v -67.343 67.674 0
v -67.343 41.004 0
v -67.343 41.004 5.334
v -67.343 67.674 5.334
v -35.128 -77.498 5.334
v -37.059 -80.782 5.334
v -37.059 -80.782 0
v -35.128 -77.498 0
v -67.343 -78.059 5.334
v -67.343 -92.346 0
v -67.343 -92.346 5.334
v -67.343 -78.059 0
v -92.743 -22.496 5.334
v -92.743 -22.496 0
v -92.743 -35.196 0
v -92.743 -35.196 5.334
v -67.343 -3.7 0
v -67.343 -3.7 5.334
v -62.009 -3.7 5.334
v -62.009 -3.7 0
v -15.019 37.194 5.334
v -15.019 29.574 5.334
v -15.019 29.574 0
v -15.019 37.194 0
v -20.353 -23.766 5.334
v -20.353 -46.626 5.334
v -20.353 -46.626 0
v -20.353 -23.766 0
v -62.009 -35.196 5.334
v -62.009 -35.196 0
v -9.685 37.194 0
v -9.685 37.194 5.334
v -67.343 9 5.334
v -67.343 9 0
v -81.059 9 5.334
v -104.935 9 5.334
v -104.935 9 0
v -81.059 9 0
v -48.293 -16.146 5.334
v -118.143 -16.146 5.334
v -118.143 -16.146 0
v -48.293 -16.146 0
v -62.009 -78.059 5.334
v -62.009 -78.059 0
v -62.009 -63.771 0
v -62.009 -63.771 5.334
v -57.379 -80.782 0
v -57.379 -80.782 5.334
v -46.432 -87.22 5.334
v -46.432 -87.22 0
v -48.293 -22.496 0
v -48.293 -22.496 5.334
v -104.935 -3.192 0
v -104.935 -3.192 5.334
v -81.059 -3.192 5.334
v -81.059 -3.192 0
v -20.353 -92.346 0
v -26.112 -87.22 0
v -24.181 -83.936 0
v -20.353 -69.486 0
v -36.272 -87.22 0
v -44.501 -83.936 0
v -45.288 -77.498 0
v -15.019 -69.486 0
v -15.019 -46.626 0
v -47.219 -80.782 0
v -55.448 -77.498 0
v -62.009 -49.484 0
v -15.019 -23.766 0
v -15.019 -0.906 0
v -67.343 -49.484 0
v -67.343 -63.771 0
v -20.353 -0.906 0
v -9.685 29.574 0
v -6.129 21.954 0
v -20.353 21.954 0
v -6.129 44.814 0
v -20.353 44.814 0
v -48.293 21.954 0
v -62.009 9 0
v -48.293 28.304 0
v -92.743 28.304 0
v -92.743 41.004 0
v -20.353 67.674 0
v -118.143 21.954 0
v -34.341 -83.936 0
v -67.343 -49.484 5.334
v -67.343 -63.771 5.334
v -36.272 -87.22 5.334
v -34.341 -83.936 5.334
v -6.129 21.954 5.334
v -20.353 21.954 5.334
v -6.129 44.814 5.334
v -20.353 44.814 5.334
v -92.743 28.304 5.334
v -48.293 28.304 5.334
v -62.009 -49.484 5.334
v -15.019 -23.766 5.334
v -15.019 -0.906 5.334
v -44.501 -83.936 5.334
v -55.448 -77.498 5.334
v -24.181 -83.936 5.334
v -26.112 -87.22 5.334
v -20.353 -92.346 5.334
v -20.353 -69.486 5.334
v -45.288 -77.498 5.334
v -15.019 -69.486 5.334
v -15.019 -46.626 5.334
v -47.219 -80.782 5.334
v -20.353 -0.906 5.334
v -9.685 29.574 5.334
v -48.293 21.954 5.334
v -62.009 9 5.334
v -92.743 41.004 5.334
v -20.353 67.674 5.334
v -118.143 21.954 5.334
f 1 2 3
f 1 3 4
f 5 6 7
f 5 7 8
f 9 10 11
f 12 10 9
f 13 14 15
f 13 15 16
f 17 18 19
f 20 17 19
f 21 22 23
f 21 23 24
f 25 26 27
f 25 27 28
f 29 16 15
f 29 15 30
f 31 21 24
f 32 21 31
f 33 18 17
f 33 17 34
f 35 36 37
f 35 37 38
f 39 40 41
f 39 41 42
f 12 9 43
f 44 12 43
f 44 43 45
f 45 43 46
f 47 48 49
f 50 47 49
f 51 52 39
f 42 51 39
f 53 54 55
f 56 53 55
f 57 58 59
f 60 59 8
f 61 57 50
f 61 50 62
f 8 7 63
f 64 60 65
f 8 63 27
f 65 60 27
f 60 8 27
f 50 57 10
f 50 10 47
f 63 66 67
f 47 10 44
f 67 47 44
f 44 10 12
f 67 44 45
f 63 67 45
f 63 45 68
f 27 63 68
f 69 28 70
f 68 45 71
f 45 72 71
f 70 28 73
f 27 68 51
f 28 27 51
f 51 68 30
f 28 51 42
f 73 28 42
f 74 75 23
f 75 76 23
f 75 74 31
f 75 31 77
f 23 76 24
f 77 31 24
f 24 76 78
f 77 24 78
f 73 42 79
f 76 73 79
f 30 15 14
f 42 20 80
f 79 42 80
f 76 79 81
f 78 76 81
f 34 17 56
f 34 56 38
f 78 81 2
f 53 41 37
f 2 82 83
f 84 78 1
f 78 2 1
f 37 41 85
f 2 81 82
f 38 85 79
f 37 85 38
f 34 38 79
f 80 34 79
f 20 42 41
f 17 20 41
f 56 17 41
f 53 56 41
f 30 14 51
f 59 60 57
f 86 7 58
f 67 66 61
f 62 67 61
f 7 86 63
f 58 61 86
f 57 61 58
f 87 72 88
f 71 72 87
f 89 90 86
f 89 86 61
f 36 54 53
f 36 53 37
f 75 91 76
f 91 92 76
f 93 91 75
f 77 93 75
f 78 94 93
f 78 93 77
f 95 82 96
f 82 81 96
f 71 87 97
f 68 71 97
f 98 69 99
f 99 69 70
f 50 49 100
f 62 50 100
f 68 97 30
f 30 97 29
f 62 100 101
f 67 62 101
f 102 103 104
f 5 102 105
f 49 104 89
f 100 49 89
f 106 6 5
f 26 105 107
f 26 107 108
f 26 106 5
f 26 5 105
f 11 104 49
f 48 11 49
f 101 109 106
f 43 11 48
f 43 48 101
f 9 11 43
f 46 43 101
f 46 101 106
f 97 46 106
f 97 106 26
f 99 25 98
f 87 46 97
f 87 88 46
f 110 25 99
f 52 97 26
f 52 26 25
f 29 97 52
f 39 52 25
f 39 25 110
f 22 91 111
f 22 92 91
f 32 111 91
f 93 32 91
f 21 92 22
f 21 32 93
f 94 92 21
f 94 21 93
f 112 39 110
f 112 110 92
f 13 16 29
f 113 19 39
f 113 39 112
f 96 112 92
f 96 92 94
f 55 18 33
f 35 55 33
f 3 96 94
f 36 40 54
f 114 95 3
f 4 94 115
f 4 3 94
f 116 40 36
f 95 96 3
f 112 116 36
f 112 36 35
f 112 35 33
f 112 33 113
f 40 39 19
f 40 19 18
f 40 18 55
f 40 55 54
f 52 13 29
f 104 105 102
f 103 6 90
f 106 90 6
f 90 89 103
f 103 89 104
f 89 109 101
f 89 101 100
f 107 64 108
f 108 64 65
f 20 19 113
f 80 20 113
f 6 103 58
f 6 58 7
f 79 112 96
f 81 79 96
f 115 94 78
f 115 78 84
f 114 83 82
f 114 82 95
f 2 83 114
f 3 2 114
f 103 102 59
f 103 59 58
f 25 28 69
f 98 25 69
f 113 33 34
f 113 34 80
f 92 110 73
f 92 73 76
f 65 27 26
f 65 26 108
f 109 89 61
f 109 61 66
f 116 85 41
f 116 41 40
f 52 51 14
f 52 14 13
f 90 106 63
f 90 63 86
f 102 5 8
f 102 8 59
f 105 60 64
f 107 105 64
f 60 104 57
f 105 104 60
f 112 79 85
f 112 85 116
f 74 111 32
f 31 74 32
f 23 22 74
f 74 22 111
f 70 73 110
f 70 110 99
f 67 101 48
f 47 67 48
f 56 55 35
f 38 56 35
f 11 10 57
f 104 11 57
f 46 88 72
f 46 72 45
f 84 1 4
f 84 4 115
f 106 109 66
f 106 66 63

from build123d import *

# Parameters (mm, degrees)
SKETCH1_W           = 52.324
SKETCH1_H           = 160.02
BOSS_EXTRUDE1_DEPTH = 5.334
SKETCH2_W           = 5.334
SKETCH2_H           = 22.86
CUT_EXTRUDE1_DEPTH  = 115.417820658
SKETCH3_W           = 5.334
SKETCH3_H           = 38.1
BOSS_EXTRUDE2_DEPTH = 50.8
SKETCH4_W           = 23.876
SKETCH4_H           = 12.192
CUT_EXTRUDE2_DEPTH  = 151.047185381
SKETCH5_W           = 19.05
SKETCH5_H           = 6.35
CUT_EXTRUDE3_DEPTH  = 151.047185381
SKETCH6_W           = 5.334
SKETCH6_H           = 12.7
BOSS_EXTRUDE3_DEPTH = 25.4
SKETCH7_W           = 5.334
SKETCH7_H           = 12.7
BOSS_EXTRUDE4_DEPTH = 25.4
SKETCH8_W           = 5.334
SKETCH8_H           = 14.2875
CUT_EXTRUDE4_DEPTH  = 151.047185381
SKETCH9_W           = 5.334
SKETCH9_H           = 12.7
CUT_EXTRUDE5_DEPTH  = 151.047185381
CUT_EXTRUDE6_DEPTH  = 151.047185381
SKETCH11_W          = 5.334
SKETCH11_H          = 22.86
BOSS_EXTRUDE5_DEPTH = 8.89
SKETCH12_W          = 5.334
SKETCH12_H          = 7.62
CUT_EXTRUDE7_DEPTH  = 151.047185381


with BuildPart() as part:
    # Sketch1 → Boss-Extrude1 (new body)
    with BuildSketch(Plane.XY):
        with Locations((-41.181308627, -12.336439624)):
            Rectangle(SKETCH1_W, SKETCH1_H)
    extrude(amount=BOSS_EXTRUDE1_DEPTH)

    # Sketch2 → Cut-Extrude1 (cut, through all)
    with BuildSketch(Plane.XY.offset(5.334)):
        with Locations((-17.686308627, 56.243560376)):
            Rectangle(SKETCH2_W, SKETCH2_H)
        with Locations((-17.686308627, 10.523560376)):
            Rectangle(SKETCH2_W, SKETCH2_H)
        with Locations((-17.686308627, -35.196439624)):
            Rectangle(SKETCH2_W, SKETCH2_H)
        with Locations((-17.686308627, -80.916439624)):
            Rectangle(SKETCH2_W, SKETCH2_H)
    extrude(amount=-CUT_EXTRUDE1_DEPTH, mode=Mode.SUBTRACT)

    # Sketch3 → Boss-Extrude2 (add)
    with BuildSketch(Plane.ZY.offset(67.343308627)):
        with Locations((2.667, 2.903560376)):
            Rectangle(SKETCH3_W, SKETCH3_H)
    extrude(amount=BOSS_EXTRUDE2_DEPTH)

    # Sketch4 → Cut-Extrude2 (cut, through all)
    with BuildSketch(Plane.XY.offset(5.334)):
        with Locations((-92.997308627, 2.903560376)):
            Rectangle(SKETCH4_W, SKETCH4_H)
    extrude(amount=-CUT_EXTRUDE2_DEPTH, mode=Mode.SUBTRACT)

    # Sketch5 → Cut-Extrude3 (cut, through all)
    with BuildSketch(Plane.XY.offset(5.334)):
        with Locations((-57.818308627, 25.128560376)):
            Rectangle(SKETCH5_W, SKETCH5_H)
        with Locations((-57.818308627, -19.321439624)):
            Rectangle(SKETCH5_W, SKETCH5_H)
    extrude(amount=-CUT_EXTRUDE3_DEPTH, mode=Mode.SUBTRACT)

    # Sketch6 → Boss-Extrude3 (add)
    with BuildSketch(Plane.ZY.offset(67.343308627)):
        with Locations((2.667, 34.653560376)):
            Rectangle(SKETCH6_W, SKETCH6_H)
    extrude(amount=BOSS_EXTRUDE3_DEPTH)

    # Sketch7 → Boss-Extrude4 (add)
    with BuildSketch(Plane.ZY.offset(67.343308627)):
        with Locations((2.667, -28.846439624)):
            Rectangle(SKETCH7_W, SKETCH7_H)
    extrude(amount=BOSS_EXTRUDE4_DEPTH)

    # Sketch8 → Cut-Extrude4 (cut, through all)
    with BuildSketch(Plane.XY.offset(5.334)):
        with Locations((-64.676308627, -42.340189624)):
            Rectangle(SKETCH8_W, SKETCH8_H)
        with Locations((-64.676308627, -70.915189624)):
            Rectangle(SKETCH8_W, SKETCH8_H)
    extrude(amount=-CUT_EXTRUDE4_DEPTH, mode=Mode.SUBTRACT)

    # Sketch9 → Cut-Extrude5 (cut, through all)
    with BuildSketch(Plane.XY.offset(5.334)):
        with Locations((-64.676308627, 2.649560376)):
            Rectangle(SKETCH9_W, SKETCH9_H)
    extrude(amount=-CUT_EXTRUDE5_DEPTH, mode=Mode.SUBTRACT)

    # Sketch10 → Cut-Extrude6 (cut, through all)
    with BuildSketch(Plane.XY.offset(5.334)):
        Polygon((-57.379441561, -80.781874862), (-46.432343901, -87.220124068), (-44.50086914, -83.93599477), (-55.447966799, -77.497745564), align=None)
        Polygon((-45.287966799, -77.497745564), (-34.34086914, -83.93599477), (-36.272343901, -87.220124068), (-47.219441561, -80.781874862), align=None)
        Polygon((-35.127966799, -77.497745564), (-24.18086914, -83.93599477), (-26.112343901, -87.220124068), (-37.059441561, -80.781874862), align=None)
    extrude(amount=-CUT_EXTRUDE6_DEPTH, mode=Mode.SUBTRACT)

    # Sketch11 → Boss-Extrude5 (add)
    with BuildSketch(Plane(origin=(-15.019308627, 0, 0), x_dir=(0, 0, -1), z_dir=(1, 0, 0))):
        with Locations((-2.667, 33.383560376)):
            Rectangle(SKETCH11_W, SKETCH11_H)
    extrude(amount=BOSS_EXTRUDE5_DEPTH)

    # Sketch12 → Cut-Extrude7 (cut, through all)
    with BuildSketch(Plane.XY.offset(5.334)):
        with Locations((-12.352308627, 33.383560376)):
            Rectangle(SKETCH12_W, SKETCH12_H)
    extrude(amount=-CUT_EXTRUDE7_DEPTH, mode=Mode.SUBTRACT)


solid = part.part
